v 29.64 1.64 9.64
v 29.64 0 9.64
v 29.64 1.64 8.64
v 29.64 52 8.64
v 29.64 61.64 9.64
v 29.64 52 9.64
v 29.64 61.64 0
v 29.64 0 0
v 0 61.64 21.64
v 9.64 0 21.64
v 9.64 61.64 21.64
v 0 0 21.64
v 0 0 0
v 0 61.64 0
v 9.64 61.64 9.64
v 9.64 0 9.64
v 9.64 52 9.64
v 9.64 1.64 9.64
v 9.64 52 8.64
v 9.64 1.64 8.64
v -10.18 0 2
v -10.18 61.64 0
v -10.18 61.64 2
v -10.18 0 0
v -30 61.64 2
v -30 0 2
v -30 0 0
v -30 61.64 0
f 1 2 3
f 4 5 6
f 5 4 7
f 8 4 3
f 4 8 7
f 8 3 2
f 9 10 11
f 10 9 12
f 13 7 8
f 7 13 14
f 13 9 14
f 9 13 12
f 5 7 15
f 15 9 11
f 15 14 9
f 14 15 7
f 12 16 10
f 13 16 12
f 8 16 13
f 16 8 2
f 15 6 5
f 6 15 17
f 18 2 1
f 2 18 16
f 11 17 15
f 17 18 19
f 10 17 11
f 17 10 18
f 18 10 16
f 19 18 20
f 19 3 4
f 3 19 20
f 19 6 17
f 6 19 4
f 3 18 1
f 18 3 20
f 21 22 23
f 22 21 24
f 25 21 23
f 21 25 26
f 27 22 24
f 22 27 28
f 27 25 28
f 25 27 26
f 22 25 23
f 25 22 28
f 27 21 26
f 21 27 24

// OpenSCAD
bias = 0.18;

module case() {
    difference () {
        difference () {
            translate([bias, bias, bias])
                cube([30 - 2 * bias, 62 - 2 * bias, 22 - 2 * bias]);
                
            translate([10 - bias, 0 - bias, 10 - bias])
                cube([20 + bias, 62 + 2 * bias, 12 + bias]);
        };
        
        translate([10 - bias, 2 - bias, 9 - bias])
            cube([20 + 2 * bias, 50 + 2 * bias, 1 + 2 * bias]);
    };
}

translate([-bias, -bias, -bias])
    case();

translate([-30, 0, 0])
    cube([20 - bias, 62 - 2 * bias, 2]);
